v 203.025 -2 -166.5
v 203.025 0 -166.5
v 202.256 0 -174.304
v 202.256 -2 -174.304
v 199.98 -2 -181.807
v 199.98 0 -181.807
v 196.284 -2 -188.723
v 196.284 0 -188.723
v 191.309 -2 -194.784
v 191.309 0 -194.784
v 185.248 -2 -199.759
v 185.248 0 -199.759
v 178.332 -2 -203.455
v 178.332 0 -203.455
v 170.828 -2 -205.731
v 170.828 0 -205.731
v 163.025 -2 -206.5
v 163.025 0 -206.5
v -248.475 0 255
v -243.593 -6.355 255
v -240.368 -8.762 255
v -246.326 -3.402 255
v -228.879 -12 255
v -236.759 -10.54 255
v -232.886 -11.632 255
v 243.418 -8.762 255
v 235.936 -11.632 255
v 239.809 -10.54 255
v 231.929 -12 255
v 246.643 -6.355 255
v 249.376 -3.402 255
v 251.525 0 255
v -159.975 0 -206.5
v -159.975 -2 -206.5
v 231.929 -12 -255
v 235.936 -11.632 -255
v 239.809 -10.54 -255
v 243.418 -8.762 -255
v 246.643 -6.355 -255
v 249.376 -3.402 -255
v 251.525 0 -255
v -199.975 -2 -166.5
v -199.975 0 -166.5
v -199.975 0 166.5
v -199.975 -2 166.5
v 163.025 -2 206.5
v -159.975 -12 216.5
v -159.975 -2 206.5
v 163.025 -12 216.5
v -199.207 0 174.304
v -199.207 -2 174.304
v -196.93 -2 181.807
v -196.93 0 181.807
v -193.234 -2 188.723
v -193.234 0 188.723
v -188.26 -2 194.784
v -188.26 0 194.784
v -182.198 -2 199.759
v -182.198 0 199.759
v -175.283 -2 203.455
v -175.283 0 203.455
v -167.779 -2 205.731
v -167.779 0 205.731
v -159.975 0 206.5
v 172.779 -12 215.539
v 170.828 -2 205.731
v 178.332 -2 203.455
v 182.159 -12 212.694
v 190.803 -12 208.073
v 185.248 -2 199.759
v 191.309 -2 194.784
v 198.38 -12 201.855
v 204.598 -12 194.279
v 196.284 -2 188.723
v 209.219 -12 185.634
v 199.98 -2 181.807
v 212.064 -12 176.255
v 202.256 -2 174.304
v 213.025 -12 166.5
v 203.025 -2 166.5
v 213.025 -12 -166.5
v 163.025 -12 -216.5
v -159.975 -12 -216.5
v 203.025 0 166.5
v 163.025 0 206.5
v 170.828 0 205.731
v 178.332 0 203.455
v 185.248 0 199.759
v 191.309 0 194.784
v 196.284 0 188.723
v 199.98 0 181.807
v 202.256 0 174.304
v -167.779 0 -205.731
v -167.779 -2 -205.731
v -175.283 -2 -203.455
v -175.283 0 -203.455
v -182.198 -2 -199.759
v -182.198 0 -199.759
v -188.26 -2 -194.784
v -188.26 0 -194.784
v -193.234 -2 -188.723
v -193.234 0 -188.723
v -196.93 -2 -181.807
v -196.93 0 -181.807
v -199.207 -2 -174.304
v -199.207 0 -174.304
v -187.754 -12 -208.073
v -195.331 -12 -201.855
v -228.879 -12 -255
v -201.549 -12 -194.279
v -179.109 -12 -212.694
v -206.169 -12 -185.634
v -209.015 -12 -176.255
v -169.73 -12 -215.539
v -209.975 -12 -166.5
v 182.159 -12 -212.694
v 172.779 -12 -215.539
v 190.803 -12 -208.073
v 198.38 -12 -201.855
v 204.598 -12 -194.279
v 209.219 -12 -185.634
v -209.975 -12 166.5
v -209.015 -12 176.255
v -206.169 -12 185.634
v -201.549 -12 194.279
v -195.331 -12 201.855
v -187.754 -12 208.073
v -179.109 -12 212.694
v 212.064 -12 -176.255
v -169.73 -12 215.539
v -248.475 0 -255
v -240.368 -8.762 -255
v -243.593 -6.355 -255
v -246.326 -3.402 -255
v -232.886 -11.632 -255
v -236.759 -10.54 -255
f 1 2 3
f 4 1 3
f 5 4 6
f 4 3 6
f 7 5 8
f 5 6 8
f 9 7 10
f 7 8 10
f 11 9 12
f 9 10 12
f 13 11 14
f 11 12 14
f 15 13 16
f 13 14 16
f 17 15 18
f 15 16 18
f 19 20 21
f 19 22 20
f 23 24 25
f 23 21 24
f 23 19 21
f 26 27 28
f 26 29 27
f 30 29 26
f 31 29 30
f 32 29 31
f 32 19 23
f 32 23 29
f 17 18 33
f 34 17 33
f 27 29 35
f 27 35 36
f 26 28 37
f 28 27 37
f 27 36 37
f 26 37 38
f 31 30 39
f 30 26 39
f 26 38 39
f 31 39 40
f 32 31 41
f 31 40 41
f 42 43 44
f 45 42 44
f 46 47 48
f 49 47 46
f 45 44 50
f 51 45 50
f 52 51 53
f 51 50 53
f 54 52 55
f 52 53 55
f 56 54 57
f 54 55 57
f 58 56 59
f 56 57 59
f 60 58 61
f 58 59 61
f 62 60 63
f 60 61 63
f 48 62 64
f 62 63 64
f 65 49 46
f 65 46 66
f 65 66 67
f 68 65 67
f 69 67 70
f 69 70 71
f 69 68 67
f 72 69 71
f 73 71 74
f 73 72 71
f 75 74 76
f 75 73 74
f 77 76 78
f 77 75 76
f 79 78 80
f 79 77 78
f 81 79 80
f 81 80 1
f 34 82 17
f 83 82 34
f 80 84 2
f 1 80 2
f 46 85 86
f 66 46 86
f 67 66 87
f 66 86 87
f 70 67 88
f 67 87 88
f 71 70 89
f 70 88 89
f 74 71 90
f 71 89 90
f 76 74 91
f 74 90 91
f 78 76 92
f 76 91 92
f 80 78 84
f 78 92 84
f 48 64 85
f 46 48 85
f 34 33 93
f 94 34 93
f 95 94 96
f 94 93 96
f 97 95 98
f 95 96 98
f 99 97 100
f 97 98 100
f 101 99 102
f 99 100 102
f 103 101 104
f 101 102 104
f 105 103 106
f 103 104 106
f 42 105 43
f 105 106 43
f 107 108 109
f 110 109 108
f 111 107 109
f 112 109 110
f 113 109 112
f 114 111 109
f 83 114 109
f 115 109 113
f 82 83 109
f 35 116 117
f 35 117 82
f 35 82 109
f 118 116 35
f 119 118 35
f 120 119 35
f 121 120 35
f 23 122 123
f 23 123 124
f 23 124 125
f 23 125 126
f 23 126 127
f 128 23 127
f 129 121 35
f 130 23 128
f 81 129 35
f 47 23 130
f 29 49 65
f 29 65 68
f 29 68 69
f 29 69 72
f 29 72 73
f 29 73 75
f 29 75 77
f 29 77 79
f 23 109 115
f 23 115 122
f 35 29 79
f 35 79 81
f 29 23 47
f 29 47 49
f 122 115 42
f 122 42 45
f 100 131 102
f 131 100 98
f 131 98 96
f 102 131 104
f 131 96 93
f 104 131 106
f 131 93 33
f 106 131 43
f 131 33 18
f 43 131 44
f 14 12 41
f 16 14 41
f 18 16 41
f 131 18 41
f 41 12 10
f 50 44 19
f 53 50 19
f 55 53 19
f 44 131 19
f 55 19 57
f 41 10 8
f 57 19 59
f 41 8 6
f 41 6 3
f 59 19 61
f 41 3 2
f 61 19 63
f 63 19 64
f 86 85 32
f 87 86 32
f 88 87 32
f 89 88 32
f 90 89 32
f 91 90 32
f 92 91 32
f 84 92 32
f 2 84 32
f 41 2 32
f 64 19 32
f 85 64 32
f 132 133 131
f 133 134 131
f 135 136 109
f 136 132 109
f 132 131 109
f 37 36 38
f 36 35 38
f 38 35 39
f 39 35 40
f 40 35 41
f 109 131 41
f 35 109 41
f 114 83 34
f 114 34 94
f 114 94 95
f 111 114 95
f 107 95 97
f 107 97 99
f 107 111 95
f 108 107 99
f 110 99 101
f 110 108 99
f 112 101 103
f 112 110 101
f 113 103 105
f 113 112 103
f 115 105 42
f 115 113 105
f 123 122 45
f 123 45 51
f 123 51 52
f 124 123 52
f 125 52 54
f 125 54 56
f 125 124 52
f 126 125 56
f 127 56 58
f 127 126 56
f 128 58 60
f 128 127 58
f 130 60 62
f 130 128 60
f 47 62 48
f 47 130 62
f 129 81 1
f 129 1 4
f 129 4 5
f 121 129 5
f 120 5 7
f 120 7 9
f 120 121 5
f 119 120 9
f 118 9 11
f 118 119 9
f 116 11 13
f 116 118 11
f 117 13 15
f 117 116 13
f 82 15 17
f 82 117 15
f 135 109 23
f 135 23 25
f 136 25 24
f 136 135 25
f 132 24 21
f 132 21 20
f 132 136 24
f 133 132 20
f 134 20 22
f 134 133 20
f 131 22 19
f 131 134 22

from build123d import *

# Parameters (mm, degrees)
F0_W        = 500
F0_H        = 510
F1_DEPTH    = 12
F2_SIZE     = 10
F3_T1_DEPTH = 607.9795897113


# Not quite as in the source:
# - a fillet or chamfer that OpenCascade refuses, or shapes differently, is made with other operations: its cross-section is extruded or revolved along the edge and cut away or added


with BuildPart() as f1:
    # F0 (on Front) → F1 (new body)
    with BuildSketch(Plane.XZ):
        with Locations((1.5247634146, 0)):
            Rectangle(F0_W, F0_H)
        with BuildLine():
            ThreePointArc((-199.9752365854, 166.5), (-188.2595078328, 194.7842712475), (-159.9752365854, 206.5))
            Line((-159.9752365854, 206.5), (163.0247634146, 206.5))
            ThreePointArc((163.0247634146, 206.5), (191.3090346621, 194.7842712475), (203.0247634146, 166.5))
            Line((203.0247634146, 166.5), (203.0247634146, -166.5))
            ThreePointArc((203.0247634146, -166.5), (191.3090346621, -194.7842712475), (163.0247634146, -206.5))
            Line((163.0247634146, -206.5), (-159.9752365854, -206.5))
            ThreePointArc((-159.9752365854, -206.5), (-188.2595078328, -194.7842712475), (-199.9752365854, -166.5))
            Line((-199.9752365854, -166.5), (-199.9752365854, 166.5))
        make_face(mode=Mode.SUBTRACT)
    extrude(amount=F1_DEPTH)

    # F2
    f2_edges = [f1.edges().sort_by_distance(p)[0] for p in [
        (1.524763, -12, 206.5),
        (-199.975237, -12, 0),
        (-188.259508, -12, 194.784271),
        (191.309035, -12, 194.784271),
        (203.024763, -12, 0),
        (191.309035, -12, -194.784271),
        (1.524763, -12, -206.5),
        (-188.259508, -12, -194.784271),
    ]]
    chamfer(f2_edges, length=F2_SIZE)

    # F3: fillet of radius 22 on 2 edges, made by hand

    # F3_s2 → F3_t1 (cut)
    with BuildSketch(Plane.XY.offset(-303.9897948557)):
        with BuildLine():
            ThreePointArc((-228.8793186431, -12), (-240.3684439362, -8.7616630393), (-248.4752365854, 0))
            Line((-248.4752365854, 0), (-248.4752365854, -12))
            Line((-248.4752365854, -12), (-228.8793186431, -12))
        make_face()
        with BuildLine():
            ThreePointArc((231.9288454724, -12), (243.4179707654, -8.7616630393), (251.5247634146, 0))
            Line((251.5247634146, 0), (251.5247634146, -12))
            Line((251.5247634146, -12), (231.9288454724, -12))
        make_face()
    extrude(amount=F3_T1_DEPTH, mode=Mode.SUBTRACT)


solid = f1.part
